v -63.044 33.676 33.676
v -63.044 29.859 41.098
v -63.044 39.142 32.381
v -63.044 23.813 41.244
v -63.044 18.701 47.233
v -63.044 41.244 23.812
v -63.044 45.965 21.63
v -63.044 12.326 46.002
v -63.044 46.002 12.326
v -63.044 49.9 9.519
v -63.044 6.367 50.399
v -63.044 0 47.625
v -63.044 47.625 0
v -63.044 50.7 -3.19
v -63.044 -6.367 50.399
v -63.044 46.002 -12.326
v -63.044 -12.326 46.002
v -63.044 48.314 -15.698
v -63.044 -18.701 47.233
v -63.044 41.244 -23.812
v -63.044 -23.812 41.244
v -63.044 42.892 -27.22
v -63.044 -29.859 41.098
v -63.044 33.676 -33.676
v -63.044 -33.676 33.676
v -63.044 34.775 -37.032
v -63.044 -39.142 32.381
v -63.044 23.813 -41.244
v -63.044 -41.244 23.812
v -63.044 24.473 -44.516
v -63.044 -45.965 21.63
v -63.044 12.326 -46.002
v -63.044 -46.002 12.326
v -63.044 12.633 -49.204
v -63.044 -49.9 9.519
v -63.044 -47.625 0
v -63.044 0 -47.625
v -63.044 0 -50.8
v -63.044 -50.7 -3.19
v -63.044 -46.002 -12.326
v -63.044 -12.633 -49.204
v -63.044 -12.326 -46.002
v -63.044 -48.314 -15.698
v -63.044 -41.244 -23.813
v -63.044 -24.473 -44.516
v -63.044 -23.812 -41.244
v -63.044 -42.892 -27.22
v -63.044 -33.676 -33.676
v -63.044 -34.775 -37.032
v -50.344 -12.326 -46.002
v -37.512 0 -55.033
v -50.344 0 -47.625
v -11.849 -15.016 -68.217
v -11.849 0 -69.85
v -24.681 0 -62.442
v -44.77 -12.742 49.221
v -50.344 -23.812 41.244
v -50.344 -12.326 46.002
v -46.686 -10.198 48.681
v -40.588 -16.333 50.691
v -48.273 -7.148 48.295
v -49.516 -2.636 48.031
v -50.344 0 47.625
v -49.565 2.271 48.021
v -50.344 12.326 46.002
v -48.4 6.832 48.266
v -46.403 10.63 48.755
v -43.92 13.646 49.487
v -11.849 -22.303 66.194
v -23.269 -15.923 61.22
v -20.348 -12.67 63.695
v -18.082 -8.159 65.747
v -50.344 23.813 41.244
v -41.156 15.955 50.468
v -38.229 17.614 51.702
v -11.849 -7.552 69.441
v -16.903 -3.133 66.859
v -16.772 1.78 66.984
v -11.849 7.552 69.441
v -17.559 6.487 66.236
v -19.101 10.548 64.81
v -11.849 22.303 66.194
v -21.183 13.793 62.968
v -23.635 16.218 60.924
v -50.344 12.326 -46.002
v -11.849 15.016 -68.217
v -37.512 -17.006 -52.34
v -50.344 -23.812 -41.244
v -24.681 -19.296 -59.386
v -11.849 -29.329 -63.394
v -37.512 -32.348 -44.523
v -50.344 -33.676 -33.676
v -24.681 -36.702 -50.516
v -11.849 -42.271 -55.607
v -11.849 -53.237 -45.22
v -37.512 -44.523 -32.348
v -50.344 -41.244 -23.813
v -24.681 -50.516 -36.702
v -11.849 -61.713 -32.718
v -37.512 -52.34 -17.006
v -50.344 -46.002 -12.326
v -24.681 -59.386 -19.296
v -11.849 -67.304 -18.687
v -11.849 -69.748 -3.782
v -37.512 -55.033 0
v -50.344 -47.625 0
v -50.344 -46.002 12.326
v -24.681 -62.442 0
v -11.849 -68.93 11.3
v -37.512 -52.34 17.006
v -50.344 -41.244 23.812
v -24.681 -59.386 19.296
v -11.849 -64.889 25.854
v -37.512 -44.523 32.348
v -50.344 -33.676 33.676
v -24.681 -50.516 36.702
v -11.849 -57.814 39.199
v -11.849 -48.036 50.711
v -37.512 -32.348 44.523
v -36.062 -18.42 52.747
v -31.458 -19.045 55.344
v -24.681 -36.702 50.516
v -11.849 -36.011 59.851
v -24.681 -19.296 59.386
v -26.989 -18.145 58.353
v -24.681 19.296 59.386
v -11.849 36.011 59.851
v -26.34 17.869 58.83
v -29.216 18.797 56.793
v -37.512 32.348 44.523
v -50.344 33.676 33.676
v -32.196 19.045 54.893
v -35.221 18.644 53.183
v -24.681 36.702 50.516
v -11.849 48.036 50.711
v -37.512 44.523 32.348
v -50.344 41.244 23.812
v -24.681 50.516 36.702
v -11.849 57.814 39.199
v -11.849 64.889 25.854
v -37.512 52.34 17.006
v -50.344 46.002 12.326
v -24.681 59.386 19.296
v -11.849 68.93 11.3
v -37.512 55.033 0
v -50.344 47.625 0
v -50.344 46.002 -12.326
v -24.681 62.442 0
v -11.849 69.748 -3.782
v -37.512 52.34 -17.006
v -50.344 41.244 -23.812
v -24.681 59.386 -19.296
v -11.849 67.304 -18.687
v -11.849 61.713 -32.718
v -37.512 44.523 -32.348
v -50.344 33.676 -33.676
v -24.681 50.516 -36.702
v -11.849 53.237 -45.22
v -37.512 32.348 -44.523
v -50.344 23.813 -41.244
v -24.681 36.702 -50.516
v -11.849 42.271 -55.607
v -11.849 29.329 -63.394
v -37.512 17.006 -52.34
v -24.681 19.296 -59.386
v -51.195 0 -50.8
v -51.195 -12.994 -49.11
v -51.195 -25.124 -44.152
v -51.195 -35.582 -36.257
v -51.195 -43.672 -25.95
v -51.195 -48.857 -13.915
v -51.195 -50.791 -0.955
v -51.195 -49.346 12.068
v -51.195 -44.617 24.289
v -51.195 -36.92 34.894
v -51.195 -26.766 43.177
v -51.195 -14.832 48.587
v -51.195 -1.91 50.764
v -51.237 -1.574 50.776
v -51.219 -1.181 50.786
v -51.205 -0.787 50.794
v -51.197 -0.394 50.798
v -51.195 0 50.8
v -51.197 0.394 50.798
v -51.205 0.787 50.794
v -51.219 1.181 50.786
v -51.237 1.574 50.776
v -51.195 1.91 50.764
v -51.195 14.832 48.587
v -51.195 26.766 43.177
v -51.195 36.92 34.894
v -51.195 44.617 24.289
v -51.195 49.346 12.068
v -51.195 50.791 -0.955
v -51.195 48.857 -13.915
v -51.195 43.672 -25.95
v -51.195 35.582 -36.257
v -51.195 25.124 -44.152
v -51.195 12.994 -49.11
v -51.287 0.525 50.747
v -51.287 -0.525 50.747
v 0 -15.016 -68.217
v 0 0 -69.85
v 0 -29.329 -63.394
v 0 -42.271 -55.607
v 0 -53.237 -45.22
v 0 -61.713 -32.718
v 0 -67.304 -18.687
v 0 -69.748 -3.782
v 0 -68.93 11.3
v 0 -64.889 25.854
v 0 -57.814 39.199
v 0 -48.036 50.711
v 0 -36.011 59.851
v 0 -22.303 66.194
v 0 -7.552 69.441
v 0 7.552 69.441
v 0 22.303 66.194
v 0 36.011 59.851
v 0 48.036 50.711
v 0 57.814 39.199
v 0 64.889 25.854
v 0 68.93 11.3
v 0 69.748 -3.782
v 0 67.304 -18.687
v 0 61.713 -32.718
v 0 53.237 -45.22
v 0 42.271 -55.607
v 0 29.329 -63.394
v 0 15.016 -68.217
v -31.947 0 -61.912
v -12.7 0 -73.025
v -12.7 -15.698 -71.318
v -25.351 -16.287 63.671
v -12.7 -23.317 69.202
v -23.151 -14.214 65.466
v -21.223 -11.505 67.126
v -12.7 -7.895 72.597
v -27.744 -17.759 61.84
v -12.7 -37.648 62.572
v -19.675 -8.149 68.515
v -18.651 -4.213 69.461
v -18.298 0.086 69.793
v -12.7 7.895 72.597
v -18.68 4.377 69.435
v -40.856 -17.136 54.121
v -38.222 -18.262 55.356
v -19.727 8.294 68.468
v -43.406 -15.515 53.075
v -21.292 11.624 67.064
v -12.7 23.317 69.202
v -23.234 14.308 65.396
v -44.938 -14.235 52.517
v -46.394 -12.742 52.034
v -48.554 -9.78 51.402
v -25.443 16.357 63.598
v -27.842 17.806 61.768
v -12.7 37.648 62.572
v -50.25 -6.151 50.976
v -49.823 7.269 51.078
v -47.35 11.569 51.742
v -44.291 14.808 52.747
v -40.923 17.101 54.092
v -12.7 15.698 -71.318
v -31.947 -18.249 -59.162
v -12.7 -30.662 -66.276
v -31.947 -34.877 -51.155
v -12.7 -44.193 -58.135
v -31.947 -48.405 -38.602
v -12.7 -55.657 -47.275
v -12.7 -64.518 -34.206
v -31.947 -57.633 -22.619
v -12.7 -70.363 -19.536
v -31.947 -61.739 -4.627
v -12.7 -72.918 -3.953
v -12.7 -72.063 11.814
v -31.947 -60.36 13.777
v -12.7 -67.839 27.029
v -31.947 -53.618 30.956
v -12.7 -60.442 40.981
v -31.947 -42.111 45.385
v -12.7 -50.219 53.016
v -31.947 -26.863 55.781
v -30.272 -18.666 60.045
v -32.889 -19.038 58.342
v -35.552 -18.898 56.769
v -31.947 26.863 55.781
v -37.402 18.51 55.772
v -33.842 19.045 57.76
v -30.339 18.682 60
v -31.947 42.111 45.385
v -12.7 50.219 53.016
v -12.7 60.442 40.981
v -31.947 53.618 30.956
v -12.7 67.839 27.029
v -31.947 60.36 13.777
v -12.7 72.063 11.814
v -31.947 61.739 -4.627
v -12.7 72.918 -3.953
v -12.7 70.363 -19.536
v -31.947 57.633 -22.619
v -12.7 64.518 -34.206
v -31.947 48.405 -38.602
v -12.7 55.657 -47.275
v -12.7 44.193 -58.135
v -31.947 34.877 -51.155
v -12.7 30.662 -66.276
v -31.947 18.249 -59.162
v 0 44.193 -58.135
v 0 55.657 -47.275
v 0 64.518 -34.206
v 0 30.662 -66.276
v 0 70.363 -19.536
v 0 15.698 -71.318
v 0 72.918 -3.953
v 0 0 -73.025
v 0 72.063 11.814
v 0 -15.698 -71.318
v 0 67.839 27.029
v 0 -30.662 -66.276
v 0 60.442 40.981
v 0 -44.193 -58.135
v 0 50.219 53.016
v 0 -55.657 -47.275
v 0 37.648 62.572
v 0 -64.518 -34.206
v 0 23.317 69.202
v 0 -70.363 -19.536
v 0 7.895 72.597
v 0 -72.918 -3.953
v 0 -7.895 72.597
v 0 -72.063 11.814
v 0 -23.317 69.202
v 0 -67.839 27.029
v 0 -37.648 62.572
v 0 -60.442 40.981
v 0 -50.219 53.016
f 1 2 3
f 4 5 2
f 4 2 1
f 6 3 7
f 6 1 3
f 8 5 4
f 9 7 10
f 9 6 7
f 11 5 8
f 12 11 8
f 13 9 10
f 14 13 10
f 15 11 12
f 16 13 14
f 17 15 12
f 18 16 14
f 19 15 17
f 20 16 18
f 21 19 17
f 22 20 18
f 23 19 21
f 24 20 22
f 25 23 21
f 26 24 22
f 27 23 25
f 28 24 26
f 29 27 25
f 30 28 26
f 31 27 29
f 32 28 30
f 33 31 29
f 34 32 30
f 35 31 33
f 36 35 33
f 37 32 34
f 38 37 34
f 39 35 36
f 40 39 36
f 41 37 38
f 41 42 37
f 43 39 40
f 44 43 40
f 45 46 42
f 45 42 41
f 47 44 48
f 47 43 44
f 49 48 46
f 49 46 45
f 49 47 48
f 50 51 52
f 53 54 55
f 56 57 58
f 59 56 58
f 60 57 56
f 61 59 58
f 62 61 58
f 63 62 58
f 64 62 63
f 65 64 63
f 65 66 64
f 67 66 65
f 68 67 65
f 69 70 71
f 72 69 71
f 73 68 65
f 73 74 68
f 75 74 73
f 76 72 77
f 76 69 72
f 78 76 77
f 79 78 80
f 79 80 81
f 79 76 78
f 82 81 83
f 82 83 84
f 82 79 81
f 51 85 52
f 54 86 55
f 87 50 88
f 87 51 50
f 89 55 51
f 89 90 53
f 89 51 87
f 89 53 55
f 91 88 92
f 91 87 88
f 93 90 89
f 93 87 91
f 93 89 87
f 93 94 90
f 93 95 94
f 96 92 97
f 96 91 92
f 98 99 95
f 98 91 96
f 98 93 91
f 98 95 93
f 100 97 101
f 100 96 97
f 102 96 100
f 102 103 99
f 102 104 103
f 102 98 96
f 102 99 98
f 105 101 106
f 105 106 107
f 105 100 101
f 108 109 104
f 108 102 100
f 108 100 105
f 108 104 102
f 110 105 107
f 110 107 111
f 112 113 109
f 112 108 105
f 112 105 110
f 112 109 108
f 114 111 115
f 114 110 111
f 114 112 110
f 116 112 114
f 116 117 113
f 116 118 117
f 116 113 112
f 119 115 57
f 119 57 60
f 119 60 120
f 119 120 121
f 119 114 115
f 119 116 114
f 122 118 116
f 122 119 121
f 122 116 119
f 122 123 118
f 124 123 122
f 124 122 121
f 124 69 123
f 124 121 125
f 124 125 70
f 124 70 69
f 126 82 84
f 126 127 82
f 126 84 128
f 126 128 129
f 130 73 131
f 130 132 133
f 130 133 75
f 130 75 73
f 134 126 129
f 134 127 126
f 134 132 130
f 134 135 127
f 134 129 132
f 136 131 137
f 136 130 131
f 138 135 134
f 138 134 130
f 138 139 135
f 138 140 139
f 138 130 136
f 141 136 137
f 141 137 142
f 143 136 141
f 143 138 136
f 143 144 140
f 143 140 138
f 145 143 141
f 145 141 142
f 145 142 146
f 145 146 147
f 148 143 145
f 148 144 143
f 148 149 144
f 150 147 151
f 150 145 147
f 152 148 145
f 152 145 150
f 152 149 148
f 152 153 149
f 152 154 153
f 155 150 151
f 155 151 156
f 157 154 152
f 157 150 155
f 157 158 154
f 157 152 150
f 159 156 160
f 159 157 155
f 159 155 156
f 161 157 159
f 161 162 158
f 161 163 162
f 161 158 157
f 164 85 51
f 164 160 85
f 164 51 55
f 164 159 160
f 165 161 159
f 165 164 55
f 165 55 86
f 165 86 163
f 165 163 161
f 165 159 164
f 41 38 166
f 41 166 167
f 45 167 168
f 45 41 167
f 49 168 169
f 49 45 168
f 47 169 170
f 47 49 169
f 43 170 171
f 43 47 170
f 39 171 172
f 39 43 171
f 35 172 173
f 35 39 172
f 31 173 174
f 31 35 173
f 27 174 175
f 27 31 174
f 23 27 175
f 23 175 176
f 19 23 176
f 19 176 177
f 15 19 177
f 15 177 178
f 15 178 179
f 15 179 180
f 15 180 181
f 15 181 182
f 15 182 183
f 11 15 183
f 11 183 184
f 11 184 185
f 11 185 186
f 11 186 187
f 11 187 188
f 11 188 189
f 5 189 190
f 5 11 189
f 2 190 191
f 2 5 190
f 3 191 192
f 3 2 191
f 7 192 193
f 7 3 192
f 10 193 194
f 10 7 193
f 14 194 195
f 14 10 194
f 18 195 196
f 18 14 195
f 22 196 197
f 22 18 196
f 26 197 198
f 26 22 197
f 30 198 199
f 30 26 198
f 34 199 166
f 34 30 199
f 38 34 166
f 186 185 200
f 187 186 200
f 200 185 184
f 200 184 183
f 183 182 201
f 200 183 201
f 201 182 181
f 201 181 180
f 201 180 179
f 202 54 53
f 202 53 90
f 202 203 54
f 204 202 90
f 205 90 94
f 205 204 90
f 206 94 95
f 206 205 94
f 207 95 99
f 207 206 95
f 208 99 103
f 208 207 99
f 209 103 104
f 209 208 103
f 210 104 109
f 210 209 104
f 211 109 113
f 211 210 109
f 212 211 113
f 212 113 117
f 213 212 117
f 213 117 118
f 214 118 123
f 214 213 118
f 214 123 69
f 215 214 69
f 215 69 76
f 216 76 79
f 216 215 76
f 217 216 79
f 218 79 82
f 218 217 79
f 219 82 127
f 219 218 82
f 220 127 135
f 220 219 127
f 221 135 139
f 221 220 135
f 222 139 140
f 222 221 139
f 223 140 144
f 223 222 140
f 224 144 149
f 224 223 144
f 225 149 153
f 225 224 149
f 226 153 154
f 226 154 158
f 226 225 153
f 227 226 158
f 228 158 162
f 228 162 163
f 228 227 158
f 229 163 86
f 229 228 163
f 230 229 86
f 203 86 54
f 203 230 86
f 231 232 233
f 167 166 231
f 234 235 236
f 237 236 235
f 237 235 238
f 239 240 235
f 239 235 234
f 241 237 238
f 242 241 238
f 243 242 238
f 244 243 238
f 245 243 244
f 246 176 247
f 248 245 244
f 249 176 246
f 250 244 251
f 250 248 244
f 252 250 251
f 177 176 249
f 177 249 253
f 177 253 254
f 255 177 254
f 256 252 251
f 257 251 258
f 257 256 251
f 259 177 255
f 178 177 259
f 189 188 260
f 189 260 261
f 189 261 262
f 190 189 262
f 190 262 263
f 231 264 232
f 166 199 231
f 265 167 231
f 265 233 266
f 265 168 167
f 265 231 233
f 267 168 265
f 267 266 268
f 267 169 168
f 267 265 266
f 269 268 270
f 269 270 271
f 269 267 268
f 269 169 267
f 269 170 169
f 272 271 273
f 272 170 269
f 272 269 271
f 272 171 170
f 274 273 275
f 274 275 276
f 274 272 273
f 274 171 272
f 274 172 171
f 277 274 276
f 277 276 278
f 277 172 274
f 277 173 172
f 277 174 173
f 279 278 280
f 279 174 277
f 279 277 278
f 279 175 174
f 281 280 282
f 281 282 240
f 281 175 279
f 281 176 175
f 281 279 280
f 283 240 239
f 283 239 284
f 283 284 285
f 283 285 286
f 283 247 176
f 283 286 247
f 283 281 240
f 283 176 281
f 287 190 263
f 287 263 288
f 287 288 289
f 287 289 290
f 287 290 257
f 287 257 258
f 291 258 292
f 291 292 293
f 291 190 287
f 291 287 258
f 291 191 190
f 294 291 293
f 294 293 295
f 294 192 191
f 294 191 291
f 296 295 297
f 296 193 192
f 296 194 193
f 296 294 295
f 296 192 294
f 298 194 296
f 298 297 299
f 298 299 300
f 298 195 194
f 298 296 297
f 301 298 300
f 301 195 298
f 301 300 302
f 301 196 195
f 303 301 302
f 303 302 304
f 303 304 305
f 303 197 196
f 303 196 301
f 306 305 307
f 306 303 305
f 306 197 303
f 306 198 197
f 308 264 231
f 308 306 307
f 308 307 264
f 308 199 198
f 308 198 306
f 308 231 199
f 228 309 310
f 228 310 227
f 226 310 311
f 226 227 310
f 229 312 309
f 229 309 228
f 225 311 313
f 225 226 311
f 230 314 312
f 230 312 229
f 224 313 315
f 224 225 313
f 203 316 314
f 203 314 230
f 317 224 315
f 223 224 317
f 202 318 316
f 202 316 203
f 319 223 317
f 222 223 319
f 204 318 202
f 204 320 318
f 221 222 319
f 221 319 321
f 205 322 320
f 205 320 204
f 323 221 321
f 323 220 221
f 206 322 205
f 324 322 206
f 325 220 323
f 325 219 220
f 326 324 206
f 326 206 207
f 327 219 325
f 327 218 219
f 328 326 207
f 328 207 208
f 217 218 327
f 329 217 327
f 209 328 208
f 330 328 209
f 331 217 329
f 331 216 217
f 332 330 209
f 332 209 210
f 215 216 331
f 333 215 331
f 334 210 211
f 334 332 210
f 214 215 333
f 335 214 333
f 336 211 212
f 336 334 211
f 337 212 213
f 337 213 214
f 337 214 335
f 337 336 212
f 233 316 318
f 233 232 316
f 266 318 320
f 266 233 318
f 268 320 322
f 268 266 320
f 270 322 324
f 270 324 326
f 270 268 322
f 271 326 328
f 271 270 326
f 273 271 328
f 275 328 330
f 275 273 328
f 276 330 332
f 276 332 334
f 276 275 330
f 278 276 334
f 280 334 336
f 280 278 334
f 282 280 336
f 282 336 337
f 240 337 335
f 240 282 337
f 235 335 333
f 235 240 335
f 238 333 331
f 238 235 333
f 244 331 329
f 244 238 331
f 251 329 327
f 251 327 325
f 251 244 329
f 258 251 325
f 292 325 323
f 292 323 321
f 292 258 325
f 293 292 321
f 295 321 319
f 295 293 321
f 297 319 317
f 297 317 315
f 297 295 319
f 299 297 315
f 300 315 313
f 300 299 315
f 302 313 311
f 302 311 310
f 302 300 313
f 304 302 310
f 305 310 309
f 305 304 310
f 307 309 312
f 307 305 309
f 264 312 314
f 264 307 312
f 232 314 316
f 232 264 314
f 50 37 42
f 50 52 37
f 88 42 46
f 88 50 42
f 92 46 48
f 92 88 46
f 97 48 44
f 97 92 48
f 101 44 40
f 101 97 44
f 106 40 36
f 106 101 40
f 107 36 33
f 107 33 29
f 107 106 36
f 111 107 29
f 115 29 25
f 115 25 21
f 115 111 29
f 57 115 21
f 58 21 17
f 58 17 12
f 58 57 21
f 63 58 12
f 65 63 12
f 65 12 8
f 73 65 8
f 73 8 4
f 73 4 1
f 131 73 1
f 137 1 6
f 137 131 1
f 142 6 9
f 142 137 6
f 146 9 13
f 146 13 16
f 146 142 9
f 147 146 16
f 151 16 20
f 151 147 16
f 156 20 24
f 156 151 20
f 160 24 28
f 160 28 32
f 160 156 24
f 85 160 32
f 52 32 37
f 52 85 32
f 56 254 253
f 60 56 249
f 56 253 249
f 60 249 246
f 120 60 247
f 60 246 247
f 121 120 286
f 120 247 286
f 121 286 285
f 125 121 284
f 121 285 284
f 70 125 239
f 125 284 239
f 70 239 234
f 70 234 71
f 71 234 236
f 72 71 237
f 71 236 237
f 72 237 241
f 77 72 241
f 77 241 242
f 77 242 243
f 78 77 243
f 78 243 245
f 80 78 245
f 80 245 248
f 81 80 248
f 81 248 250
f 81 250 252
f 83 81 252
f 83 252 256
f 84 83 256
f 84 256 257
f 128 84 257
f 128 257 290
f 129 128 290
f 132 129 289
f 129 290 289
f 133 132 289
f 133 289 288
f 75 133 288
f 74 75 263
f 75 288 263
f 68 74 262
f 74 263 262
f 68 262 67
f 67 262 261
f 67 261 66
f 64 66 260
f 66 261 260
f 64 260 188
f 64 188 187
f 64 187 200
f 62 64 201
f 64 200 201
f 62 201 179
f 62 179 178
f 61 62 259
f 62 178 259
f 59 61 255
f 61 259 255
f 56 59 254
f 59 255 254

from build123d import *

# Parameters (mm, degrees)
CUT_EXTRUDE1_REACH = 157.918
SKETCH2_R          = 19.05


with BuildPart() as part:
    # Sketch1 → Revolve1 (revolve)
    with BuildSketch(Plane.XY, mode=Mode.PRIVATE) as revolve1_sk:
        Polygon((0, 69.85), (0, 73.025), (-12.7, 73.025), (-51.194829198, 50.8), (-63.044090512, 50.8), (-63.044090512, 47.625), (-50.344090512, 47.625), (-11.849261314, 69.85), align=None)
    revolve(revolve1_sk.sketch.rotate(Axis((0, 0, 0), (-1, 0, 0)), 90), axis=Axis((0, 0, 0), (-1, 0, 0)))

    # Cut-Extrude1: up to this cone (the profile starts outside it)
    cut_extrude1_end = Plane(origin=(-34.795753, 0, 0), z_dir=(1, 0, 0)).offset(-98.037256223) * Cone(1e-06, 180.743597534, 313.057093071, align=(Align.CENTER, Align.CENTER, Align.MIN), mode=Mode.PRIVATE)
    # Sketch2 → Cut-Extrude1 (cut, up to the surface)
    with BuildSketch(Plane(origin=(-34.795752556, 0, 60.268011314), x_dir=(0.8660254037844378, 0, 0.5000000000000017), z_dir=(-0.5000000000000016, 0, 0.8660254037844377)), mode=Mode.PRIVATE) as cut_extrude1_sk1:
        with Locations(Location((0, 0, 0), (0, 0, 221.978854454))):
            Circle(SKETCH2_R)
    cut_extrude1_tool1 = extrude(cut_extrude1_sk1.sketch, amount=-CUT_EXTRUDE1_REACH, mode=Mode.PRIVATE) - cut_extrude1_end
    add(cut_extrude1_tool1.solids().sort_by_distance((-34.795753, 0, 60.268011))[0], mode=Mode.SUBTRACT)


solid = part.part
